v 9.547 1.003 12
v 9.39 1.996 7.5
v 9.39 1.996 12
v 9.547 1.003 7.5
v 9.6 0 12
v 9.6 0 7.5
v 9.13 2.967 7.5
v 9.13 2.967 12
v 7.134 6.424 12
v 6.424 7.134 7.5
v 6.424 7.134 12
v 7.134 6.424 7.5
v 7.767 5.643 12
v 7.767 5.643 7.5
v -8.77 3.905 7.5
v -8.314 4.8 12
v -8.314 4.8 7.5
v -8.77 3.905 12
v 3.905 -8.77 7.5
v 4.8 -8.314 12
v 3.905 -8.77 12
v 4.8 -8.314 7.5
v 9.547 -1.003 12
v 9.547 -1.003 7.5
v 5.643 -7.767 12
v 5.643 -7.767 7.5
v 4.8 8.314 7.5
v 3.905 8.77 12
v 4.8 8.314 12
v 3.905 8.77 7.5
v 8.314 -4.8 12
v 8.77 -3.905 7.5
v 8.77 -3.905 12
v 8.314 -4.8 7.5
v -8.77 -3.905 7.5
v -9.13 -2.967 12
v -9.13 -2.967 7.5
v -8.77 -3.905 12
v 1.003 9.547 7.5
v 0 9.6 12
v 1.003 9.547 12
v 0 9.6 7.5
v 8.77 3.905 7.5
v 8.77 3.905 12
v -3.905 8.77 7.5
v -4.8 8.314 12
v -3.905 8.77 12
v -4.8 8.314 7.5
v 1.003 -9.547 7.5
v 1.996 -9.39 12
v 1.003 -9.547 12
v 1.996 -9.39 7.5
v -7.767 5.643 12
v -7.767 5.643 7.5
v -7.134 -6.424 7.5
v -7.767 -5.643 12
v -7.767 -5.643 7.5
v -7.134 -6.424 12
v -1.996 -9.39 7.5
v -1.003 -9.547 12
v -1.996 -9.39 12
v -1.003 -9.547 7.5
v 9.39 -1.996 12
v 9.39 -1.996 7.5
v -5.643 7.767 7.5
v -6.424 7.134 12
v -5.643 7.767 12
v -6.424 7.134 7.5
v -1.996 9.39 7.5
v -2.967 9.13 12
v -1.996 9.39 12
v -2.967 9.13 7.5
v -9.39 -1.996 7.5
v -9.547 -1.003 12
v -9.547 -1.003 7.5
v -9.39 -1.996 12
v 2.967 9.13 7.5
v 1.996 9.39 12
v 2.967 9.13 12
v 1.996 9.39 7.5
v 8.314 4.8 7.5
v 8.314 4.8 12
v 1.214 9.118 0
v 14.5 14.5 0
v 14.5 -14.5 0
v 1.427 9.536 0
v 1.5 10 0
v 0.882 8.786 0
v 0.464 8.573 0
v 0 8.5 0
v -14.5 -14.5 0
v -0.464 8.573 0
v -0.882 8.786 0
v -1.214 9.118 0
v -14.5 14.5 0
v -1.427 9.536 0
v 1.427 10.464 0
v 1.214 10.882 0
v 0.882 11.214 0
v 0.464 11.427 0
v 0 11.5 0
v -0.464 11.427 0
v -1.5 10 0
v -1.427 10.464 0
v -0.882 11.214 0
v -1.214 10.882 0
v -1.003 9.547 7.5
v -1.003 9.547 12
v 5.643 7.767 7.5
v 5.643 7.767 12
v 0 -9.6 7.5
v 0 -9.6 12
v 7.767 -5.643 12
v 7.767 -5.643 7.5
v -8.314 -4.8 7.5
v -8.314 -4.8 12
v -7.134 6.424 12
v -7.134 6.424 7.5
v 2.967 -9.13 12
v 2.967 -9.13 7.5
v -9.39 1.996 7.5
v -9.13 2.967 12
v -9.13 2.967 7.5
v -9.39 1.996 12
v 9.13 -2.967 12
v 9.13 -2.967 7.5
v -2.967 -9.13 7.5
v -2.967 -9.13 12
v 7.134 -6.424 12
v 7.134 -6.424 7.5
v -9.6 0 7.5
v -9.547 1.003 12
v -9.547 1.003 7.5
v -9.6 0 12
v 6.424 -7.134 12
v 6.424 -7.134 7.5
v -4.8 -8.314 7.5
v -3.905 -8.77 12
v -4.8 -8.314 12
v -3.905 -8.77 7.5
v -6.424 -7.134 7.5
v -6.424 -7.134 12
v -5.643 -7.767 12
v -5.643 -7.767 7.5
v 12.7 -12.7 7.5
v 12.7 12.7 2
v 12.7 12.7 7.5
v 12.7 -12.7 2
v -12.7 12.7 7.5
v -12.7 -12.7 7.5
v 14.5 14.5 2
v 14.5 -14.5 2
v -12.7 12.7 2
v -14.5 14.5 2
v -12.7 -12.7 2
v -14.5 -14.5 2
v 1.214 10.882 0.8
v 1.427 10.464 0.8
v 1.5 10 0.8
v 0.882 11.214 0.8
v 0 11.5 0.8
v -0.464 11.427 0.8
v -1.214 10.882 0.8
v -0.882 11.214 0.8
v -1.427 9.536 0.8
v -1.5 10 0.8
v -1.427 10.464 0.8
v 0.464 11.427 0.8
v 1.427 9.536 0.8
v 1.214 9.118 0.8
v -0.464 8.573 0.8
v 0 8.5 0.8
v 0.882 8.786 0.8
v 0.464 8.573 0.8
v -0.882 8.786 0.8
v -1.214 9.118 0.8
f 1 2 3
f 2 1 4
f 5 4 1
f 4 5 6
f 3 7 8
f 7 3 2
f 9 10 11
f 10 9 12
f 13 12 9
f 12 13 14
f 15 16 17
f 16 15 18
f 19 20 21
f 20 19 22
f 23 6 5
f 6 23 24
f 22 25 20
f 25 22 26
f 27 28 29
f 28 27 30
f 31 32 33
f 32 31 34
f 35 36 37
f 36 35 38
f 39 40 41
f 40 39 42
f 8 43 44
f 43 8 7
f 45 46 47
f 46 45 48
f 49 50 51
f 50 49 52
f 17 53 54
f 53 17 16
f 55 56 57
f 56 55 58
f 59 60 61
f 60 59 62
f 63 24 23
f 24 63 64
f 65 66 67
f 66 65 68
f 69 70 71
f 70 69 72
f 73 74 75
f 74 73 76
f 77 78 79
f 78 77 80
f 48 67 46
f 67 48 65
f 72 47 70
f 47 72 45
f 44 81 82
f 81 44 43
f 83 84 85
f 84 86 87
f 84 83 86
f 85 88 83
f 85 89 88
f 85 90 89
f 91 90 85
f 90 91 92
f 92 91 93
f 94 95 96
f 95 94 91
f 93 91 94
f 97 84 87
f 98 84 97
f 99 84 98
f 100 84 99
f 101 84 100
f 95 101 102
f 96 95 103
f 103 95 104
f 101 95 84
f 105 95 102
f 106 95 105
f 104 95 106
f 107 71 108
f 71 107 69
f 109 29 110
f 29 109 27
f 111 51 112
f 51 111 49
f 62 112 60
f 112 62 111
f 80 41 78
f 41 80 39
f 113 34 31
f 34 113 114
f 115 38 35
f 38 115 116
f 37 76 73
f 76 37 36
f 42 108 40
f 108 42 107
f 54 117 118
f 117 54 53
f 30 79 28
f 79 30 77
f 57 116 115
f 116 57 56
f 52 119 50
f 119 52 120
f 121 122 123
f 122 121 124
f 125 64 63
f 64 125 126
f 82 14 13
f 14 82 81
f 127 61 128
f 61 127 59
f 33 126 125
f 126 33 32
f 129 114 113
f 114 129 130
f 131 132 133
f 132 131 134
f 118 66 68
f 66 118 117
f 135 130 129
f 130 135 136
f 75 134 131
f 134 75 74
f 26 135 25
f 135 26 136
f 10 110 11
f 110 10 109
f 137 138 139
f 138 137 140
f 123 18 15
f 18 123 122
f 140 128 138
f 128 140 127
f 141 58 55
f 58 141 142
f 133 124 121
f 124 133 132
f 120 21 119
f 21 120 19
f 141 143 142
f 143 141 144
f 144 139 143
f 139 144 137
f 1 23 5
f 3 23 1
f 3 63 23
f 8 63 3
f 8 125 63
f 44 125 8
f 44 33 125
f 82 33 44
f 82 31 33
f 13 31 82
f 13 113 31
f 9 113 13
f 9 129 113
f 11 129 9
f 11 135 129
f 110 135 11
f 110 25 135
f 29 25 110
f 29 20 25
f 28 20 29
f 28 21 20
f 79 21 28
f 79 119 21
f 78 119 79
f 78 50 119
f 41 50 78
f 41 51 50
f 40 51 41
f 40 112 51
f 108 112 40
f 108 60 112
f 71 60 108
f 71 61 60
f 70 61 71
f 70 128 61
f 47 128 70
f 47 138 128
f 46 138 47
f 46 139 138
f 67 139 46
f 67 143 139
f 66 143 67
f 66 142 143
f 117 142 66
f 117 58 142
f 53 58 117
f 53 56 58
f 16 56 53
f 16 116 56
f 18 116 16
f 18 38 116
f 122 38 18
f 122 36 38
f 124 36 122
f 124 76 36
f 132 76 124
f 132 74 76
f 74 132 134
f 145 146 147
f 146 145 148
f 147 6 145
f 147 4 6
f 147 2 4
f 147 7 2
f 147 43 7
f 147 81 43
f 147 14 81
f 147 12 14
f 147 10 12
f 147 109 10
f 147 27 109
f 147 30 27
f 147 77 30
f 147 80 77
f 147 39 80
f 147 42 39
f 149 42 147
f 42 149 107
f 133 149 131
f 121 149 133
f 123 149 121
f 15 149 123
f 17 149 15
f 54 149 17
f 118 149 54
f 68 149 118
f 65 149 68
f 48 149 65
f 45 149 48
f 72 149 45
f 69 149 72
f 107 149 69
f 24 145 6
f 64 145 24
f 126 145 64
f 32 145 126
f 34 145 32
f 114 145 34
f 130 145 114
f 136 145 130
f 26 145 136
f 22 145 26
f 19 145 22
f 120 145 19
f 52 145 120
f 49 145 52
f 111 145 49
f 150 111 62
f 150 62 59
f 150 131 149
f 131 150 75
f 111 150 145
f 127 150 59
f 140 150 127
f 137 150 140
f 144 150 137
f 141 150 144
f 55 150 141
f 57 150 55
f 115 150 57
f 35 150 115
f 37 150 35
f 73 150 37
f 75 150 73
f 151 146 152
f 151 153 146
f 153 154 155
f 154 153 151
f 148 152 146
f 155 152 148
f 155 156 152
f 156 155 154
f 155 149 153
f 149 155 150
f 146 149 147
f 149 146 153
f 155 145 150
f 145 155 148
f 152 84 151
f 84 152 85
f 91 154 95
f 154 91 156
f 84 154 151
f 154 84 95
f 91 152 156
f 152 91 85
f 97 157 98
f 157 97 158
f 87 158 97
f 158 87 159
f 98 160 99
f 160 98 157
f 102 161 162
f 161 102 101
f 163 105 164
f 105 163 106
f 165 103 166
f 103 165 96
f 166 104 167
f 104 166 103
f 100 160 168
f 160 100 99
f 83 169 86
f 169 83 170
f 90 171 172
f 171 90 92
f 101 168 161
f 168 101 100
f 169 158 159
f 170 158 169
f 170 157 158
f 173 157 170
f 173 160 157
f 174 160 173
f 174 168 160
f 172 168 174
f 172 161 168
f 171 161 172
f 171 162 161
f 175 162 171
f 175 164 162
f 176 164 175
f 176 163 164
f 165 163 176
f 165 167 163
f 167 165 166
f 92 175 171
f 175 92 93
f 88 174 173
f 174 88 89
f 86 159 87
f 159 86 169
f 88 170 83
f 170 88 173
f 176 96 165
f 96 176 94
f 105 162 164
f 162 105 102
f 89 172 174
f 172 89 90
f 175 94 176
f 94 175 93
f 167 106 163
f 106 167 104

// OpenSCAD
difference(){
  union(){
cylinder(d=19.2,h=12,$fn=60);
translate([-25.4/2,-25.4/2,2])
cube([25.4,25.4,5.5]);
translate([-29/2,-29/2,0])
cube([29,29,2]);
  }
  translate([0,10,0])
  cylinder(d=3,h=0.8,$fn=20);
}
